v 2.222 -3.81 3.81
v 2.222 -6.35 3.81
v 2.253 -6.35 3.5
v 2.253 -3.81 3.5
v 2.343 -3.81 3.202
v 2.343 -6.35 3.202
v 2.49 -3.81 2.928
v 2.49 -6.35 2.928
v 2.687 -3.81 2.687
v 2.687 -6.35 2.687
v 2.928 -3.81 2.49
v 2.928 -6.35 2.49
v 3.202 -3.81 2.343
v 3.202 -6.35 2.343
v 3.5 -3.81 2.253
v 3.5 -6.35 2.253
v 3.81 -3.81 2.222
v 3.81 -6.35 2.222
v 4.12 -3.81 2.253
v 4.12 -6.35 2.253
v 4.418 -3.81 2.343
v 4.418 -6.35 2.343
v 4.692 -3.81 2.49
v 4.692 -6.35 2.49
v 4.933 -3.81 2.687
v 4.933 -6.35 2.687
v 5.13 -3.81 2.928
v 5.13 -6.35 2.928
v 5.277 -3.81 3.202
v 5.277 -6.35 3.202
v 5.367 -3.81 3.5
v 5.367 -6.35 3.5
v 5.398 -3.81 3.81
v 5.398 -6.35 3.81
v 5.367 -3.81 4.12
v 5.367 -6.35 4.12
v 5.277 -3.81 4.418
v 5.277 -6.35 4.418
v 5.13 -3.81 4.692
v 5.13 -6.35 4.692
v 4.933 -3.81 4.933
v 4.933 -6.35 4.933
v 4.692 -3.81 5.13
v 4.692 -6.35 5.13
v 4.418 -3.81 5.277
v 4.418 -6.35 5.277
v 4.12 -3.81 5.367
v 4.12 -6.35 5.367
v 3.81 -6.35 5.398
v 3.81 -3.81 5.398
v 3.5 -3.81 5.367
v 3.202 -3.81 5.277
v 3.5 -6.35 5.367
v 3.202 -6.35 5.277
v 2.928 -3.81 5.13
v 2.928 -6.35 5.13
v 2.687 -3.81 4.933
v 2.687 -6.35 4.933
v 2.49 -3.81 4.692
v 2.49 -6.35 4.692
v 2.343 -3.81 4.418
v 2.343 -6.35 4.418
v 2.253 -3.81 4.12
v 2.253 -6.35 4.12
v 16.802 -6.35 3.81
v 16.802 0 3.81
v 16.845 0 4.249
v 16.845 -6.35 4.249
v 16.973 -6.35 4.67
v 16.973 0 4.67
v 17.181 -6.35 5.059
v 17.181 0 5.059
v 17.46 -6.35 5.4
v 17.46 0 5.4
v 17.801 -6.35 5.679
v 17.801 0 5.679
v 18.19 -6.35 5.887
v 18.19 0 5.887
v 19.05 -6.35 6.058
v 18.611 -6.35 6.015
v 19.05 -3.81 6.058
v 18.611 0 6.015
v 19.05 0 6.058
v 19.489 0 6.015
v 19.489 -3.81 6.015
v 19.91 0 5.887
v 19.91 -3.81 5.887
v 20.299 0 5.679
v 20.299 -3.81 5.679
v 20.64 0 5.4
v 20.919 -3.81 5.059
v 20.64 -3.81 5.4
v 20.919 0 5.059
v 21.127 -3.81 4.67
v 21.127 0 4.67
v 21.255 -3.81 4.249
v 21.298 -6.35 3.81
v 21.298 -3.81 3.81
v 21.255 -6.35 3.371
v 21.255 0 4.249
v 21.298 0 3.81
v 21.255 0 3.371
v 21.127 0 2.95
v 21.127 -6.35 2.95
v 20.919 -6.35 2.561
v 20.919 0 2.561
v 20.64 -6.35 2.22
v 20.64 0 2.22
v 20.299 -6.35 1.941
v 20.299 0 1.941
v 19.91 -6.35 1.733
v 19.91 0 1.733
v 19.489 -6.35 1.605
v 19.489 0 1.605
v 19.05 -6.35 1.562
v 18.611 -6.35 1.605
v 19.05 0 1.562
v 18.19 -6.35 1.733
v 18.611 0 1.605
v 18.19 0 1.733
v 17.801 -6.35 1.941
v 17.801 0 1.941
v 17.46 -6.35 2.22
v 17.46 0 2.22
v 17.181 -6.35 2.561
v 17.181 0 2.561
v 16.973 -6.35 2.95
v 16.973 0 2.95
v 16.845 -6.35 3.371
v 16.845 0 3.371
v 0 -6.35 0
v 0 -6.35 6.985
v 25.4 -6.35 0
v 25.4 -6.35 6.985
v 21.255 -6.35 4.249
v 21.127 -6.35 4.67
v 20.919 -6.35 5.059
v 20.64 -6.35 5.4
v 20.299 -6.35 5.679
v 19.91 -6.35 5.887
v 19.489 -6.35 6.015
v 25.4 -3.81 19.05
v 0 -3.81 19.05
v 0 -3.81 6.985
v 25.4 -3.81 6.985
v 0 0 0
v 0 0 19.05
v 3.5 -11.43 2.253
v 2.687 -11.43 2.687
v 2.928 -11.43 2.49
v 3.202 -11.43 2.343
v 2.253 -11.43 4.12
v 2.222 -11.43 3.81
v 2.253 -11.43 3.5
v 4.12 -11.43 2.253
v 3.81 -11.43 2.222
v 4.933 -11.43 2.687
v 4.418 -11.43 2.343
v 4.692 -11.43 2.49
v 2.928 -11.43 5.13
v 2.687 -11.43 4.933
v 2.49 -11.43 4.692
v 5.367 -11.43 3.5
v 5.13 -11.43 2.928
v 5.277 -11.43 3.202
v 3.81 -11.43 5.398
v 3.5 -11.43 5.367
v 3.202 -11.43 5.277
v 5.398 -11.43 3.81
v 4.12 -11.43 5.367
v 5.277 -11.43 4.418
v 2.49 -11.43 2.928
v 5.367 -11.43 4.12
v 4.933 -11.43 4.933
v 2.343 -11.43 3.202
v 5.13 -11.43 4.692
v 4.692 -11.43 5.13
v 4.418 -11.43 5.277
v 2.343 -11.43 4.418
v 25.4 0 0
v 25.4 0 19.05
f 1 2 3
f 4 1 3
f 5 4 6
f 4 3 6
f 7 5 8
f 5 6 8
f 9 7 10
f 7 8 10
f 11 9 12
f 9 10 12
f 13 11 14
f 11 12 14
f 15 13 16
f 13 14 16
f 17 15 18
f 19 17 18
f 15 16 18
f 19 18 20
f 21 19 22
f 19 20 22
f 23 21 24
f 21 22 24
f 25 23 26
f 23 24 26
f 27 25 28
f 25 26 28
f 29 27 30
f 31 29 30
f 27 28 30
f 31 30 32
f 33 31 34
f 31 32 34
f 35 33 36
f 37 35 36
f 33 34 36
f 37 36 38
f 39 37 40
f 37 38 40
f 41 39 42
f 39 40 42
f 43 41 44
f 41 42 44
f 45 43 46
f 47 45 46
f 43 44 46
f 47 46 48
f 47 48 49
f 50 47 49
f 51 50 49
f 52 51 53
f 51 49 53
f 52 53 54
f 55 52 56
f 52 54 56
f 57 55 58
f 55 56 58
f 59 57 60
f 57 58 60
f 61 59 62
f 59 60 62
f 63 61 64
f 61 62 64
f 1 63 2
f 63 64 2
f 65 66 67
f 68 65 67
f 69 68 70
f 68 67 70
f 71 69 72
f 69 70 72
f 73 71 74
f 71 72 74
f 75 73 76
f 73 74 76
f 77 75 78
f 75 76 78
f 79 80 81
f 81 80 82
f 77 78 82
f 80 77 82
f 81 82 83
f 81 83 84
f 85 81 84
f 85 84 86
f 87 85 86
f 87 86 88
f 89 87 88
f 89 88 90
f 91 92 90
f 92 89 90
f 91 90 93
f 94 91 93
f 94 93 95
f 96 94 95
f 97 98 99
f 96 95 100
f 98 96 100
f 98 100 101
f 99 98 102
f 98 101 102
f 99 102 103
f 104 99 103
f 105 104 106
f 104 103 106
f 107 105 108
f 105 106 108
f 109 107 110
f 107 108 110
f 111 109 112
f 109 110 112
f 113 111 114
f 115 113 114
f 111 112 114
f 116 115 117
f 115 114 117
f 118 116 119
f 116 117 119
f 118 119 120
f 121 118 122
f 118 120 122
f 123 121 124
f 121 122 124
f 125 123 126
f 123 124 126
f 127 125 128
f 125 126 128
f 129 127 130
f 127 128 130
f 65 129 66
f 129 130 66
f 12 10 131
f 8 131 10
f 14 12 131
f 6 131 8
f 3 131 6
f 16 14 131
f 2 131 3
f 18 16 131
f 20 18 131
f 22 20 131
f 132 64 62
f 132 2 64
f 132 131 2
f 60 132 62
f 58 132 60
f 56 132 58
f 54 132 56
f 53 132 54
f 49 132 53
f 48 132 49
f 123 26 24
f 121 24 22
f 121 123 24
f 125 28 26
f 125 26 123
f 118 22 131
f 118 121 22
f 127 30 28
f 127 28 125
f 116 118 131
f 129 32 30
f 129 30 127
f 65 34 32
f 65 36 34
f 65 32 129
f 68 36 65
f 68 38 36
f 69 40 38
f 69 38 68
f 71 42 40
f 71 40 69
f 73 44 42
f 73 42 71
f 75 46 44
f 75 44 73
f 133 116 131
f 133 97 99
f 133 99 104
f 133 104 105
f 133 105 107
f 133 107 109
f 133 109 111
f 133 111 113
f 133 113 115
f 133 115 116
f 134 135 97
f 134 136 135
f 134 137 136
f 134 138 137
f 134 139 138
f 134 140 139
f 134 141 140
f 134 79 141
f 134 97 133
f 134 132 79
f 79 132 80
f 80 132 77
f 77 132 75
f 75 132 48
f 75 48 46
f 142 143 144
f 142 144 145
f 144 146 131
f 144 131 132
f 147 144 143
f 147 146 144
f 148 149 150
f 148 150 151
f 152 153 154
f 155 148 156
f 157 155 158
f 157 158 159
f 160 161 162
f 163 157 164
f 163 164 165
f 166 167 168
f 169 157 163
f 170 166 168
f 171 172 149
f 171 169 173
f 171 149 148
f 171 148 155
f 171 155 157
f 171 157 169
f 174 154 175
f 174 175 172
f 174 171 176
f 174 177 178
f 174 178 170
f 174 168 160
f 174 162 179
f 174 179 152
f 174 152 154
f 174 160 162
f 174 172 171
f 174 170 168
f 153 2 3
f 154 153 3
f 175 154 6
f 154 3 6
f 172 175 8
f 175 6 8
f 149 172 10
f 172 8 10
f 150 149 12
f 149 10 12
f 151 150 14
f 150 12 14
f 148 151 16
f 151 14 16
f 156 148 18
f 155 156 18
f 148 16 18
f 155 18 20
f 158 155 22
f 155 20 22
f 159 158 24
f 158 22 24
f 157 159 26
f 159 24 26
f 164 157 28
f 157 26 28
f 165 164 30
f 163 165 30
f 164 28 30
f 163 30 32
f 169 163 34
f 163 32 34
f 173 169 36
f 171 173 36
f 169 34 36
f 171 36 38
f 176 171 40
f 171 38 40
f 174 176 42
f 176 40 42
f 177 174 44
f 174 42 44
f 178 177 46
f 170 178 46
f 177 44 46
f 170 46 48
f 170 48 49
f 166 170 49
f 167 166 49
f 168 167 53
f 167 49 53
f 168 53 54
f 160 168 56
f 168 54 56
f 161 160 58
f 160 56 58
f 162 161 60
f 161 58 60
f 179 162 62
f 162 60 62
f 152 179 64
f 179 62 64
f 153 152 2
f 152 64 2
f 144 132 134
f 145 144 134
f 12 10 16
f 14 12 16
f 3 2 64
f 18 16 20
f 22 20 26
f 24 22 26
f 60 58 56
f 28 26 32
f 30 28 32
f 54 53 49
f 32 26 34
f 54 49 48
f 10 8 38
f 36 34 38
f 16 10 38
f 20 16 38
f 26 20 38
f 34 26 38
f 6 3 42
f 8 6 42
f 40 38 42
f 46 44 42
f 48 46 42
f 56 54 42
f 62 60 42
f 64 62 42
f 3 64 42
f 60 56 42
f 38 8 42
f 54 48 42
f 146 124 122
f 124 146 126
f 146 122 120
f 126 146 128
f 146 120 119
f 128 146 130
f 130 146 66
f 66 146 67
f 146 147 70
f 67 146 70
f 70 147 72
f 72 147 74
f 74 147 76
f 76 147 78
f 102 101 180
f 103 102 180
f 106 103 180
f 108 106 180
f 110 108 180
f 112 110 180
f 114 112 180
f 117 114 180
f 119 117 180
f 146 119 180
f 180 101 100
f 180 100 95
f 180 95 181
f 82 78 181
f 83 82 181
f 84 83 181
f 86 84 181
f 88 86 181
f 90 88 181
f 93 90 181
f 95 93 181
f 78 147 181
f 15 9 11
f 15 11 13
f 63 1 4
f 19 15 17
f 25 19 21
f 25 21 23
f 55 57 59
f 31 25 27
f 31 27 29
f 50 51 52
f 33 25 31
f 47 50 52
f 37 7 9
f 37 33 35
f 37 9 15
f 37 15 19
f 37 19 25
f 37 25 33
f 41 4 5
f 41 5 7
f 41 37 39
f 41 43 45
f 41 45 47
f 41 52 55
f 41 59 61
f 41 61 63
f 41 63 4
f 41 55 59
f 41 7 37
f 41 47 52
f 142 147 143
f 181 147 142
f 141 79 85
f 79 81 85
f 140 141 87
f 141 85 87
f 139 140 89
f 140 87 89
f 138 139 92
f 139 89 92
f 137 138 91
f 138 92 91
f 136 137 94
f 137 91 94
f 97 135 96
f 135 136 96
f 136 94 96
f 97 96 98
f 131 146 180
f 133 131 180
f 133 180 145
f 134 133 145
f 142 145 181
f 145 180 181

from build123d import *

# Parameters (mm, degrees)
F0_W     = 25.4
F0_H     = 19.05
F1_DEPTH = 6.35
F3_D     = 4.4958
F4_DEPTH = 5.08
F6_DEPTH = 2.54


with BuildPart() as f1:
    # F0 (on Front) → F1 (new body)
    with BuildSketch(Plane.XZ):
        with Locations((12.7, 9.525)):
            Rectangle(F0_W, F0_H)
    extrude(amount=F1_DEPTH)

    # F3 (through all)
    with Locations(Plane.XZ.offset(6.35)):
        with Locations((19.05, 3.81)):
            Hole(F3_D / 2)

    # F2 (on face) → F4 (join)
    with BuildSketch(Plane.XZ.offset(6.35)):
        with BuildLine():
            ThreePointArc((5.3975, 3.81), (3.81, 5.3975), (2.2225, 3.81))
            ThreePointArc((2.2225, 3.81), (3.81, 2.2225), (5.3975, 3.81))
        make_face()
    extrude(amount=F4_DEPTH)

    # F5 (on face) → F6 (cut)
    with BuildSketch(Plane.XZ.offset(6.35)):
        with BuildLine():
            ThreePointArc((5.3975, 3.81), (3.81, 5.3975), (2.2225, 3.81))
            ThreePointArc((2.2225, 3.81), (3.81, 2.2225), (5.3975, 3.81))
        make_face()
        with BuildLine():
            ThreePointArc((21.2979, 3.81), (20.6395053334, 5.3995053334), (19.05, 6.0579))
            Line((19.05, 6.0579), (19.05, 3.81))
            Line((19.05, 3.81), (21.2979, 3.81))
        make_face()
        with BuildLine():
            Line((19.05, 3.81), (19.05, 6.0579))
            ThreePointArc((19.05, 6.0579), (17.4604946666, 2.2204946666), (21.2979, 3.81))
            Line((21.2979, 3.81), (19.05, 3.81))
        make_face()
        Polygon((0, 19.05), (0, 6.985), (19.05, 6.985), (38.1259955466, 6.985), (25.4, 19.05), align=None)
    extrude(amount=-F6_DEPTH, mode=Mode.SUBTRACT)


solid = f1.part
